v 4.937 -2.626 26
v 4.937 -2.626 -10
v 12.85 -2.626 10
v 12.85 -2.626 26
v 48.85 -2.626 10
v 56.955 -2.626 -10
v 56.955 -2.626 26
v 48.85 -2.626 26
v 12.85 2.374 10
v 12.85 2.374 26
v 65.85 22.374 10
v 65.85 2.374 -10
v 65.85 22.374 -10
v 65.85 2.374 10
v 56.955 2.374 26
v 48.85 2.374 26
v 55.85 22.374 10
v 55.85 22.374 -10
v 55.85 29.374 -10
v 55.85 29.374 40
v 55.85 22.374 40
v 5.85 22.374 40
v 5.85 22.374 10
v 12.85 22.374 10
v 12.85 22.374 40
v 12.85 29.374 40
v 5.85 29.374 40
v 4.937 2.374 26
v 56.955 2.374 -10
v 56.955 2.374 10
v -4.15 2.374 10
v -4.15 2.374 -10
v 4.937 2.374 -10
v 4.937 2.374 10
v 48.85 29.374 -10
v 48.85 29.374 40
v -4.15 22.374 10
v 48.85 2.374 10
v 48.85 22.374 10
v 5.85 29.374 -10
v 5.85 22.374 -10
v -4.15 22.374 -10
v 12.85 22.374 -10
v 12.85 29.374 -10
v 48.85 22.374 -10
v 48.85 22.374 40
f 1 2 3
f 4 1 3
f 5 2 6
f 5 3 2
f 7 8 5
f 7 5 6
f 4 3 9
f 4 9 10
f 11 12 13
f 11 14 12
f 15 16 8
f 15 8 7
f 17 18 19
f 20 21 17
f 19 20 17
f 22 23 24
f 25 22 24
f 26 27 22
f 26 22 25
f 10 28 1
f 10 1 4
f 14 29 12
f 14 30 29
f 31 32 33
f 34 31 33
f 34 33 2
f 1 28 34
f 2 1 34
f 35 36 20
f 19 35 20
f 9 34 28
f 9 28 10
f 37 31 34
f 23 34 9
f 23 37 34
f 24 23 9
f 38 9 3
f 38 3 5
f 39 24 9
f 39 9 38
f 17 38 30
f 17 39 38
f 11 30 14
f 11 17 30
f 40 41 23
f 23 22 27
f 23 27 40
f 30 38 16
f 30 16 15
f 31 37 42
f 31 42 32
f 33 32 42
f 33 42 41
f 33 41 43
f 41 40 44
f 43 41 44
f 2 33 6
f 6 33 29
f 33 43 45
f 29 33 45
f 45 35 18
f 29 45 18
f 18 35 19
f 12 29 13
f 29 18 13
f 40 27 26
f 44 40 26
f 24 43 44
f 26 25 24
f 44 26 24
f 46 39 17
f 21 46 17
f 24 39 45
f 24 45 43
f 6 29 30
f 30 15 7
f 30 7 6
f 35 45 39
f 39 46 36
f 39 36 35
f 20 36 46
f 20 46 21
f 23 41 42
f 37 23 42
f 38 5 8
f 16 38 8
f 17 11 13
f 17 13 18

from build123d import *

# Parameters (mm, degrees)
F0_W      = 7
F0_H      = 7
F1_DEPTH  = 10
F2_W      = 7
F2_H      = 7
F3_DEPTH  = 30
F4_W      = 52.0183453336
F4_H      = 10
F5_DEPTH  = 5
F6_W      = 52.0183453336
F6_H      = 5
F7_DEPTH  = 16
F8_W      = 36
F8_H      = 16
F9_DEPTH  = 25
F10_DEPTH = 25
F11_DEPTH = 10


with BuildPart() as f1:
    # F0 (on Top) → F1 (new body)
    with BuildSketch(Plane.XY):
        Polygon((65.8497434995, 2.3738544621), (65.8497434995, 22.3738544621), (55.8497434995, 22.3738544621), (48.8497434995, 22.3738544621), (12.8497434995, 22.3738544621), (5.8497434995, 22.3738544621), (-4.1502565005, 22.3738544621), (-4.1502565005, 2.3738544621), align=None)
        with Locations((52.3497434995, 25.8738544621)):
            Rectangle(F0_W, F0_H)
        with Locations((9.3497434995, 25.8738544621)):
            Rectangle(F0_W, F0_H)
    extrude(amount=F1_DEPTH)

    # F2 (on face) → F3 (join)
    with BuildSketch(Plane.XY.offset(10)):
        with Locations((9.3497434995, 25.8738544621)):
            Rectangle(F2_W, F2_H)
        with Locations((52.3497434995, 25.8738544621)):
            Rectangle(F2_W, F2_H)
    extrude(amount=F3_DEPTH)

    # F4 (on face) → F5 (join)
    with BuildSketch(Plane.XZ.offset(-2.3738544621)):
        with Locations((30.9461015277, 5)):
            Rectangle(F4_W, F4_H)
    extrude(amount=F5_DEPTH)

    # F6 (on face) → F7 (join)
    with BuildSketch(Plane.XY.offset(10)):
        with Locations((30.9461015277, -0.1261455379)):
            Rectangle(F6_W, F6_H)
    extrude(amount=F7_DEPTH)

    # F8 (on face) → F9 (cut)
    with BuildSketch(Plane.XZ.offset(2.6261455379)):
        with Locations((30.8497434995, 18)):
            Rectangle(F8_W, F8_H)
    extrude(amount=-F9_DEPTH, mode=Mode.SUBTRACT)

    # F8 (on face) → F10 (cut)
    with BuildSketch(Plane.XZ.offset(2.6261455379)):
        with Locations((30.8497434995, 18)):
            Rectangle(F8_W, F8_H)
    extrude(amount=-F10_DEPTH, mode=Mode.SUBTRACT)

    # F11 (add): a face of the model
    f11_faces = [f1.faces().sort_by_distance(p)[0] for p in [
        (30.8639986862, 11.2771275086, 0),
    ]]
    extrude(f11_faces, amount=F11_DEPTH)


solid = f1.part
